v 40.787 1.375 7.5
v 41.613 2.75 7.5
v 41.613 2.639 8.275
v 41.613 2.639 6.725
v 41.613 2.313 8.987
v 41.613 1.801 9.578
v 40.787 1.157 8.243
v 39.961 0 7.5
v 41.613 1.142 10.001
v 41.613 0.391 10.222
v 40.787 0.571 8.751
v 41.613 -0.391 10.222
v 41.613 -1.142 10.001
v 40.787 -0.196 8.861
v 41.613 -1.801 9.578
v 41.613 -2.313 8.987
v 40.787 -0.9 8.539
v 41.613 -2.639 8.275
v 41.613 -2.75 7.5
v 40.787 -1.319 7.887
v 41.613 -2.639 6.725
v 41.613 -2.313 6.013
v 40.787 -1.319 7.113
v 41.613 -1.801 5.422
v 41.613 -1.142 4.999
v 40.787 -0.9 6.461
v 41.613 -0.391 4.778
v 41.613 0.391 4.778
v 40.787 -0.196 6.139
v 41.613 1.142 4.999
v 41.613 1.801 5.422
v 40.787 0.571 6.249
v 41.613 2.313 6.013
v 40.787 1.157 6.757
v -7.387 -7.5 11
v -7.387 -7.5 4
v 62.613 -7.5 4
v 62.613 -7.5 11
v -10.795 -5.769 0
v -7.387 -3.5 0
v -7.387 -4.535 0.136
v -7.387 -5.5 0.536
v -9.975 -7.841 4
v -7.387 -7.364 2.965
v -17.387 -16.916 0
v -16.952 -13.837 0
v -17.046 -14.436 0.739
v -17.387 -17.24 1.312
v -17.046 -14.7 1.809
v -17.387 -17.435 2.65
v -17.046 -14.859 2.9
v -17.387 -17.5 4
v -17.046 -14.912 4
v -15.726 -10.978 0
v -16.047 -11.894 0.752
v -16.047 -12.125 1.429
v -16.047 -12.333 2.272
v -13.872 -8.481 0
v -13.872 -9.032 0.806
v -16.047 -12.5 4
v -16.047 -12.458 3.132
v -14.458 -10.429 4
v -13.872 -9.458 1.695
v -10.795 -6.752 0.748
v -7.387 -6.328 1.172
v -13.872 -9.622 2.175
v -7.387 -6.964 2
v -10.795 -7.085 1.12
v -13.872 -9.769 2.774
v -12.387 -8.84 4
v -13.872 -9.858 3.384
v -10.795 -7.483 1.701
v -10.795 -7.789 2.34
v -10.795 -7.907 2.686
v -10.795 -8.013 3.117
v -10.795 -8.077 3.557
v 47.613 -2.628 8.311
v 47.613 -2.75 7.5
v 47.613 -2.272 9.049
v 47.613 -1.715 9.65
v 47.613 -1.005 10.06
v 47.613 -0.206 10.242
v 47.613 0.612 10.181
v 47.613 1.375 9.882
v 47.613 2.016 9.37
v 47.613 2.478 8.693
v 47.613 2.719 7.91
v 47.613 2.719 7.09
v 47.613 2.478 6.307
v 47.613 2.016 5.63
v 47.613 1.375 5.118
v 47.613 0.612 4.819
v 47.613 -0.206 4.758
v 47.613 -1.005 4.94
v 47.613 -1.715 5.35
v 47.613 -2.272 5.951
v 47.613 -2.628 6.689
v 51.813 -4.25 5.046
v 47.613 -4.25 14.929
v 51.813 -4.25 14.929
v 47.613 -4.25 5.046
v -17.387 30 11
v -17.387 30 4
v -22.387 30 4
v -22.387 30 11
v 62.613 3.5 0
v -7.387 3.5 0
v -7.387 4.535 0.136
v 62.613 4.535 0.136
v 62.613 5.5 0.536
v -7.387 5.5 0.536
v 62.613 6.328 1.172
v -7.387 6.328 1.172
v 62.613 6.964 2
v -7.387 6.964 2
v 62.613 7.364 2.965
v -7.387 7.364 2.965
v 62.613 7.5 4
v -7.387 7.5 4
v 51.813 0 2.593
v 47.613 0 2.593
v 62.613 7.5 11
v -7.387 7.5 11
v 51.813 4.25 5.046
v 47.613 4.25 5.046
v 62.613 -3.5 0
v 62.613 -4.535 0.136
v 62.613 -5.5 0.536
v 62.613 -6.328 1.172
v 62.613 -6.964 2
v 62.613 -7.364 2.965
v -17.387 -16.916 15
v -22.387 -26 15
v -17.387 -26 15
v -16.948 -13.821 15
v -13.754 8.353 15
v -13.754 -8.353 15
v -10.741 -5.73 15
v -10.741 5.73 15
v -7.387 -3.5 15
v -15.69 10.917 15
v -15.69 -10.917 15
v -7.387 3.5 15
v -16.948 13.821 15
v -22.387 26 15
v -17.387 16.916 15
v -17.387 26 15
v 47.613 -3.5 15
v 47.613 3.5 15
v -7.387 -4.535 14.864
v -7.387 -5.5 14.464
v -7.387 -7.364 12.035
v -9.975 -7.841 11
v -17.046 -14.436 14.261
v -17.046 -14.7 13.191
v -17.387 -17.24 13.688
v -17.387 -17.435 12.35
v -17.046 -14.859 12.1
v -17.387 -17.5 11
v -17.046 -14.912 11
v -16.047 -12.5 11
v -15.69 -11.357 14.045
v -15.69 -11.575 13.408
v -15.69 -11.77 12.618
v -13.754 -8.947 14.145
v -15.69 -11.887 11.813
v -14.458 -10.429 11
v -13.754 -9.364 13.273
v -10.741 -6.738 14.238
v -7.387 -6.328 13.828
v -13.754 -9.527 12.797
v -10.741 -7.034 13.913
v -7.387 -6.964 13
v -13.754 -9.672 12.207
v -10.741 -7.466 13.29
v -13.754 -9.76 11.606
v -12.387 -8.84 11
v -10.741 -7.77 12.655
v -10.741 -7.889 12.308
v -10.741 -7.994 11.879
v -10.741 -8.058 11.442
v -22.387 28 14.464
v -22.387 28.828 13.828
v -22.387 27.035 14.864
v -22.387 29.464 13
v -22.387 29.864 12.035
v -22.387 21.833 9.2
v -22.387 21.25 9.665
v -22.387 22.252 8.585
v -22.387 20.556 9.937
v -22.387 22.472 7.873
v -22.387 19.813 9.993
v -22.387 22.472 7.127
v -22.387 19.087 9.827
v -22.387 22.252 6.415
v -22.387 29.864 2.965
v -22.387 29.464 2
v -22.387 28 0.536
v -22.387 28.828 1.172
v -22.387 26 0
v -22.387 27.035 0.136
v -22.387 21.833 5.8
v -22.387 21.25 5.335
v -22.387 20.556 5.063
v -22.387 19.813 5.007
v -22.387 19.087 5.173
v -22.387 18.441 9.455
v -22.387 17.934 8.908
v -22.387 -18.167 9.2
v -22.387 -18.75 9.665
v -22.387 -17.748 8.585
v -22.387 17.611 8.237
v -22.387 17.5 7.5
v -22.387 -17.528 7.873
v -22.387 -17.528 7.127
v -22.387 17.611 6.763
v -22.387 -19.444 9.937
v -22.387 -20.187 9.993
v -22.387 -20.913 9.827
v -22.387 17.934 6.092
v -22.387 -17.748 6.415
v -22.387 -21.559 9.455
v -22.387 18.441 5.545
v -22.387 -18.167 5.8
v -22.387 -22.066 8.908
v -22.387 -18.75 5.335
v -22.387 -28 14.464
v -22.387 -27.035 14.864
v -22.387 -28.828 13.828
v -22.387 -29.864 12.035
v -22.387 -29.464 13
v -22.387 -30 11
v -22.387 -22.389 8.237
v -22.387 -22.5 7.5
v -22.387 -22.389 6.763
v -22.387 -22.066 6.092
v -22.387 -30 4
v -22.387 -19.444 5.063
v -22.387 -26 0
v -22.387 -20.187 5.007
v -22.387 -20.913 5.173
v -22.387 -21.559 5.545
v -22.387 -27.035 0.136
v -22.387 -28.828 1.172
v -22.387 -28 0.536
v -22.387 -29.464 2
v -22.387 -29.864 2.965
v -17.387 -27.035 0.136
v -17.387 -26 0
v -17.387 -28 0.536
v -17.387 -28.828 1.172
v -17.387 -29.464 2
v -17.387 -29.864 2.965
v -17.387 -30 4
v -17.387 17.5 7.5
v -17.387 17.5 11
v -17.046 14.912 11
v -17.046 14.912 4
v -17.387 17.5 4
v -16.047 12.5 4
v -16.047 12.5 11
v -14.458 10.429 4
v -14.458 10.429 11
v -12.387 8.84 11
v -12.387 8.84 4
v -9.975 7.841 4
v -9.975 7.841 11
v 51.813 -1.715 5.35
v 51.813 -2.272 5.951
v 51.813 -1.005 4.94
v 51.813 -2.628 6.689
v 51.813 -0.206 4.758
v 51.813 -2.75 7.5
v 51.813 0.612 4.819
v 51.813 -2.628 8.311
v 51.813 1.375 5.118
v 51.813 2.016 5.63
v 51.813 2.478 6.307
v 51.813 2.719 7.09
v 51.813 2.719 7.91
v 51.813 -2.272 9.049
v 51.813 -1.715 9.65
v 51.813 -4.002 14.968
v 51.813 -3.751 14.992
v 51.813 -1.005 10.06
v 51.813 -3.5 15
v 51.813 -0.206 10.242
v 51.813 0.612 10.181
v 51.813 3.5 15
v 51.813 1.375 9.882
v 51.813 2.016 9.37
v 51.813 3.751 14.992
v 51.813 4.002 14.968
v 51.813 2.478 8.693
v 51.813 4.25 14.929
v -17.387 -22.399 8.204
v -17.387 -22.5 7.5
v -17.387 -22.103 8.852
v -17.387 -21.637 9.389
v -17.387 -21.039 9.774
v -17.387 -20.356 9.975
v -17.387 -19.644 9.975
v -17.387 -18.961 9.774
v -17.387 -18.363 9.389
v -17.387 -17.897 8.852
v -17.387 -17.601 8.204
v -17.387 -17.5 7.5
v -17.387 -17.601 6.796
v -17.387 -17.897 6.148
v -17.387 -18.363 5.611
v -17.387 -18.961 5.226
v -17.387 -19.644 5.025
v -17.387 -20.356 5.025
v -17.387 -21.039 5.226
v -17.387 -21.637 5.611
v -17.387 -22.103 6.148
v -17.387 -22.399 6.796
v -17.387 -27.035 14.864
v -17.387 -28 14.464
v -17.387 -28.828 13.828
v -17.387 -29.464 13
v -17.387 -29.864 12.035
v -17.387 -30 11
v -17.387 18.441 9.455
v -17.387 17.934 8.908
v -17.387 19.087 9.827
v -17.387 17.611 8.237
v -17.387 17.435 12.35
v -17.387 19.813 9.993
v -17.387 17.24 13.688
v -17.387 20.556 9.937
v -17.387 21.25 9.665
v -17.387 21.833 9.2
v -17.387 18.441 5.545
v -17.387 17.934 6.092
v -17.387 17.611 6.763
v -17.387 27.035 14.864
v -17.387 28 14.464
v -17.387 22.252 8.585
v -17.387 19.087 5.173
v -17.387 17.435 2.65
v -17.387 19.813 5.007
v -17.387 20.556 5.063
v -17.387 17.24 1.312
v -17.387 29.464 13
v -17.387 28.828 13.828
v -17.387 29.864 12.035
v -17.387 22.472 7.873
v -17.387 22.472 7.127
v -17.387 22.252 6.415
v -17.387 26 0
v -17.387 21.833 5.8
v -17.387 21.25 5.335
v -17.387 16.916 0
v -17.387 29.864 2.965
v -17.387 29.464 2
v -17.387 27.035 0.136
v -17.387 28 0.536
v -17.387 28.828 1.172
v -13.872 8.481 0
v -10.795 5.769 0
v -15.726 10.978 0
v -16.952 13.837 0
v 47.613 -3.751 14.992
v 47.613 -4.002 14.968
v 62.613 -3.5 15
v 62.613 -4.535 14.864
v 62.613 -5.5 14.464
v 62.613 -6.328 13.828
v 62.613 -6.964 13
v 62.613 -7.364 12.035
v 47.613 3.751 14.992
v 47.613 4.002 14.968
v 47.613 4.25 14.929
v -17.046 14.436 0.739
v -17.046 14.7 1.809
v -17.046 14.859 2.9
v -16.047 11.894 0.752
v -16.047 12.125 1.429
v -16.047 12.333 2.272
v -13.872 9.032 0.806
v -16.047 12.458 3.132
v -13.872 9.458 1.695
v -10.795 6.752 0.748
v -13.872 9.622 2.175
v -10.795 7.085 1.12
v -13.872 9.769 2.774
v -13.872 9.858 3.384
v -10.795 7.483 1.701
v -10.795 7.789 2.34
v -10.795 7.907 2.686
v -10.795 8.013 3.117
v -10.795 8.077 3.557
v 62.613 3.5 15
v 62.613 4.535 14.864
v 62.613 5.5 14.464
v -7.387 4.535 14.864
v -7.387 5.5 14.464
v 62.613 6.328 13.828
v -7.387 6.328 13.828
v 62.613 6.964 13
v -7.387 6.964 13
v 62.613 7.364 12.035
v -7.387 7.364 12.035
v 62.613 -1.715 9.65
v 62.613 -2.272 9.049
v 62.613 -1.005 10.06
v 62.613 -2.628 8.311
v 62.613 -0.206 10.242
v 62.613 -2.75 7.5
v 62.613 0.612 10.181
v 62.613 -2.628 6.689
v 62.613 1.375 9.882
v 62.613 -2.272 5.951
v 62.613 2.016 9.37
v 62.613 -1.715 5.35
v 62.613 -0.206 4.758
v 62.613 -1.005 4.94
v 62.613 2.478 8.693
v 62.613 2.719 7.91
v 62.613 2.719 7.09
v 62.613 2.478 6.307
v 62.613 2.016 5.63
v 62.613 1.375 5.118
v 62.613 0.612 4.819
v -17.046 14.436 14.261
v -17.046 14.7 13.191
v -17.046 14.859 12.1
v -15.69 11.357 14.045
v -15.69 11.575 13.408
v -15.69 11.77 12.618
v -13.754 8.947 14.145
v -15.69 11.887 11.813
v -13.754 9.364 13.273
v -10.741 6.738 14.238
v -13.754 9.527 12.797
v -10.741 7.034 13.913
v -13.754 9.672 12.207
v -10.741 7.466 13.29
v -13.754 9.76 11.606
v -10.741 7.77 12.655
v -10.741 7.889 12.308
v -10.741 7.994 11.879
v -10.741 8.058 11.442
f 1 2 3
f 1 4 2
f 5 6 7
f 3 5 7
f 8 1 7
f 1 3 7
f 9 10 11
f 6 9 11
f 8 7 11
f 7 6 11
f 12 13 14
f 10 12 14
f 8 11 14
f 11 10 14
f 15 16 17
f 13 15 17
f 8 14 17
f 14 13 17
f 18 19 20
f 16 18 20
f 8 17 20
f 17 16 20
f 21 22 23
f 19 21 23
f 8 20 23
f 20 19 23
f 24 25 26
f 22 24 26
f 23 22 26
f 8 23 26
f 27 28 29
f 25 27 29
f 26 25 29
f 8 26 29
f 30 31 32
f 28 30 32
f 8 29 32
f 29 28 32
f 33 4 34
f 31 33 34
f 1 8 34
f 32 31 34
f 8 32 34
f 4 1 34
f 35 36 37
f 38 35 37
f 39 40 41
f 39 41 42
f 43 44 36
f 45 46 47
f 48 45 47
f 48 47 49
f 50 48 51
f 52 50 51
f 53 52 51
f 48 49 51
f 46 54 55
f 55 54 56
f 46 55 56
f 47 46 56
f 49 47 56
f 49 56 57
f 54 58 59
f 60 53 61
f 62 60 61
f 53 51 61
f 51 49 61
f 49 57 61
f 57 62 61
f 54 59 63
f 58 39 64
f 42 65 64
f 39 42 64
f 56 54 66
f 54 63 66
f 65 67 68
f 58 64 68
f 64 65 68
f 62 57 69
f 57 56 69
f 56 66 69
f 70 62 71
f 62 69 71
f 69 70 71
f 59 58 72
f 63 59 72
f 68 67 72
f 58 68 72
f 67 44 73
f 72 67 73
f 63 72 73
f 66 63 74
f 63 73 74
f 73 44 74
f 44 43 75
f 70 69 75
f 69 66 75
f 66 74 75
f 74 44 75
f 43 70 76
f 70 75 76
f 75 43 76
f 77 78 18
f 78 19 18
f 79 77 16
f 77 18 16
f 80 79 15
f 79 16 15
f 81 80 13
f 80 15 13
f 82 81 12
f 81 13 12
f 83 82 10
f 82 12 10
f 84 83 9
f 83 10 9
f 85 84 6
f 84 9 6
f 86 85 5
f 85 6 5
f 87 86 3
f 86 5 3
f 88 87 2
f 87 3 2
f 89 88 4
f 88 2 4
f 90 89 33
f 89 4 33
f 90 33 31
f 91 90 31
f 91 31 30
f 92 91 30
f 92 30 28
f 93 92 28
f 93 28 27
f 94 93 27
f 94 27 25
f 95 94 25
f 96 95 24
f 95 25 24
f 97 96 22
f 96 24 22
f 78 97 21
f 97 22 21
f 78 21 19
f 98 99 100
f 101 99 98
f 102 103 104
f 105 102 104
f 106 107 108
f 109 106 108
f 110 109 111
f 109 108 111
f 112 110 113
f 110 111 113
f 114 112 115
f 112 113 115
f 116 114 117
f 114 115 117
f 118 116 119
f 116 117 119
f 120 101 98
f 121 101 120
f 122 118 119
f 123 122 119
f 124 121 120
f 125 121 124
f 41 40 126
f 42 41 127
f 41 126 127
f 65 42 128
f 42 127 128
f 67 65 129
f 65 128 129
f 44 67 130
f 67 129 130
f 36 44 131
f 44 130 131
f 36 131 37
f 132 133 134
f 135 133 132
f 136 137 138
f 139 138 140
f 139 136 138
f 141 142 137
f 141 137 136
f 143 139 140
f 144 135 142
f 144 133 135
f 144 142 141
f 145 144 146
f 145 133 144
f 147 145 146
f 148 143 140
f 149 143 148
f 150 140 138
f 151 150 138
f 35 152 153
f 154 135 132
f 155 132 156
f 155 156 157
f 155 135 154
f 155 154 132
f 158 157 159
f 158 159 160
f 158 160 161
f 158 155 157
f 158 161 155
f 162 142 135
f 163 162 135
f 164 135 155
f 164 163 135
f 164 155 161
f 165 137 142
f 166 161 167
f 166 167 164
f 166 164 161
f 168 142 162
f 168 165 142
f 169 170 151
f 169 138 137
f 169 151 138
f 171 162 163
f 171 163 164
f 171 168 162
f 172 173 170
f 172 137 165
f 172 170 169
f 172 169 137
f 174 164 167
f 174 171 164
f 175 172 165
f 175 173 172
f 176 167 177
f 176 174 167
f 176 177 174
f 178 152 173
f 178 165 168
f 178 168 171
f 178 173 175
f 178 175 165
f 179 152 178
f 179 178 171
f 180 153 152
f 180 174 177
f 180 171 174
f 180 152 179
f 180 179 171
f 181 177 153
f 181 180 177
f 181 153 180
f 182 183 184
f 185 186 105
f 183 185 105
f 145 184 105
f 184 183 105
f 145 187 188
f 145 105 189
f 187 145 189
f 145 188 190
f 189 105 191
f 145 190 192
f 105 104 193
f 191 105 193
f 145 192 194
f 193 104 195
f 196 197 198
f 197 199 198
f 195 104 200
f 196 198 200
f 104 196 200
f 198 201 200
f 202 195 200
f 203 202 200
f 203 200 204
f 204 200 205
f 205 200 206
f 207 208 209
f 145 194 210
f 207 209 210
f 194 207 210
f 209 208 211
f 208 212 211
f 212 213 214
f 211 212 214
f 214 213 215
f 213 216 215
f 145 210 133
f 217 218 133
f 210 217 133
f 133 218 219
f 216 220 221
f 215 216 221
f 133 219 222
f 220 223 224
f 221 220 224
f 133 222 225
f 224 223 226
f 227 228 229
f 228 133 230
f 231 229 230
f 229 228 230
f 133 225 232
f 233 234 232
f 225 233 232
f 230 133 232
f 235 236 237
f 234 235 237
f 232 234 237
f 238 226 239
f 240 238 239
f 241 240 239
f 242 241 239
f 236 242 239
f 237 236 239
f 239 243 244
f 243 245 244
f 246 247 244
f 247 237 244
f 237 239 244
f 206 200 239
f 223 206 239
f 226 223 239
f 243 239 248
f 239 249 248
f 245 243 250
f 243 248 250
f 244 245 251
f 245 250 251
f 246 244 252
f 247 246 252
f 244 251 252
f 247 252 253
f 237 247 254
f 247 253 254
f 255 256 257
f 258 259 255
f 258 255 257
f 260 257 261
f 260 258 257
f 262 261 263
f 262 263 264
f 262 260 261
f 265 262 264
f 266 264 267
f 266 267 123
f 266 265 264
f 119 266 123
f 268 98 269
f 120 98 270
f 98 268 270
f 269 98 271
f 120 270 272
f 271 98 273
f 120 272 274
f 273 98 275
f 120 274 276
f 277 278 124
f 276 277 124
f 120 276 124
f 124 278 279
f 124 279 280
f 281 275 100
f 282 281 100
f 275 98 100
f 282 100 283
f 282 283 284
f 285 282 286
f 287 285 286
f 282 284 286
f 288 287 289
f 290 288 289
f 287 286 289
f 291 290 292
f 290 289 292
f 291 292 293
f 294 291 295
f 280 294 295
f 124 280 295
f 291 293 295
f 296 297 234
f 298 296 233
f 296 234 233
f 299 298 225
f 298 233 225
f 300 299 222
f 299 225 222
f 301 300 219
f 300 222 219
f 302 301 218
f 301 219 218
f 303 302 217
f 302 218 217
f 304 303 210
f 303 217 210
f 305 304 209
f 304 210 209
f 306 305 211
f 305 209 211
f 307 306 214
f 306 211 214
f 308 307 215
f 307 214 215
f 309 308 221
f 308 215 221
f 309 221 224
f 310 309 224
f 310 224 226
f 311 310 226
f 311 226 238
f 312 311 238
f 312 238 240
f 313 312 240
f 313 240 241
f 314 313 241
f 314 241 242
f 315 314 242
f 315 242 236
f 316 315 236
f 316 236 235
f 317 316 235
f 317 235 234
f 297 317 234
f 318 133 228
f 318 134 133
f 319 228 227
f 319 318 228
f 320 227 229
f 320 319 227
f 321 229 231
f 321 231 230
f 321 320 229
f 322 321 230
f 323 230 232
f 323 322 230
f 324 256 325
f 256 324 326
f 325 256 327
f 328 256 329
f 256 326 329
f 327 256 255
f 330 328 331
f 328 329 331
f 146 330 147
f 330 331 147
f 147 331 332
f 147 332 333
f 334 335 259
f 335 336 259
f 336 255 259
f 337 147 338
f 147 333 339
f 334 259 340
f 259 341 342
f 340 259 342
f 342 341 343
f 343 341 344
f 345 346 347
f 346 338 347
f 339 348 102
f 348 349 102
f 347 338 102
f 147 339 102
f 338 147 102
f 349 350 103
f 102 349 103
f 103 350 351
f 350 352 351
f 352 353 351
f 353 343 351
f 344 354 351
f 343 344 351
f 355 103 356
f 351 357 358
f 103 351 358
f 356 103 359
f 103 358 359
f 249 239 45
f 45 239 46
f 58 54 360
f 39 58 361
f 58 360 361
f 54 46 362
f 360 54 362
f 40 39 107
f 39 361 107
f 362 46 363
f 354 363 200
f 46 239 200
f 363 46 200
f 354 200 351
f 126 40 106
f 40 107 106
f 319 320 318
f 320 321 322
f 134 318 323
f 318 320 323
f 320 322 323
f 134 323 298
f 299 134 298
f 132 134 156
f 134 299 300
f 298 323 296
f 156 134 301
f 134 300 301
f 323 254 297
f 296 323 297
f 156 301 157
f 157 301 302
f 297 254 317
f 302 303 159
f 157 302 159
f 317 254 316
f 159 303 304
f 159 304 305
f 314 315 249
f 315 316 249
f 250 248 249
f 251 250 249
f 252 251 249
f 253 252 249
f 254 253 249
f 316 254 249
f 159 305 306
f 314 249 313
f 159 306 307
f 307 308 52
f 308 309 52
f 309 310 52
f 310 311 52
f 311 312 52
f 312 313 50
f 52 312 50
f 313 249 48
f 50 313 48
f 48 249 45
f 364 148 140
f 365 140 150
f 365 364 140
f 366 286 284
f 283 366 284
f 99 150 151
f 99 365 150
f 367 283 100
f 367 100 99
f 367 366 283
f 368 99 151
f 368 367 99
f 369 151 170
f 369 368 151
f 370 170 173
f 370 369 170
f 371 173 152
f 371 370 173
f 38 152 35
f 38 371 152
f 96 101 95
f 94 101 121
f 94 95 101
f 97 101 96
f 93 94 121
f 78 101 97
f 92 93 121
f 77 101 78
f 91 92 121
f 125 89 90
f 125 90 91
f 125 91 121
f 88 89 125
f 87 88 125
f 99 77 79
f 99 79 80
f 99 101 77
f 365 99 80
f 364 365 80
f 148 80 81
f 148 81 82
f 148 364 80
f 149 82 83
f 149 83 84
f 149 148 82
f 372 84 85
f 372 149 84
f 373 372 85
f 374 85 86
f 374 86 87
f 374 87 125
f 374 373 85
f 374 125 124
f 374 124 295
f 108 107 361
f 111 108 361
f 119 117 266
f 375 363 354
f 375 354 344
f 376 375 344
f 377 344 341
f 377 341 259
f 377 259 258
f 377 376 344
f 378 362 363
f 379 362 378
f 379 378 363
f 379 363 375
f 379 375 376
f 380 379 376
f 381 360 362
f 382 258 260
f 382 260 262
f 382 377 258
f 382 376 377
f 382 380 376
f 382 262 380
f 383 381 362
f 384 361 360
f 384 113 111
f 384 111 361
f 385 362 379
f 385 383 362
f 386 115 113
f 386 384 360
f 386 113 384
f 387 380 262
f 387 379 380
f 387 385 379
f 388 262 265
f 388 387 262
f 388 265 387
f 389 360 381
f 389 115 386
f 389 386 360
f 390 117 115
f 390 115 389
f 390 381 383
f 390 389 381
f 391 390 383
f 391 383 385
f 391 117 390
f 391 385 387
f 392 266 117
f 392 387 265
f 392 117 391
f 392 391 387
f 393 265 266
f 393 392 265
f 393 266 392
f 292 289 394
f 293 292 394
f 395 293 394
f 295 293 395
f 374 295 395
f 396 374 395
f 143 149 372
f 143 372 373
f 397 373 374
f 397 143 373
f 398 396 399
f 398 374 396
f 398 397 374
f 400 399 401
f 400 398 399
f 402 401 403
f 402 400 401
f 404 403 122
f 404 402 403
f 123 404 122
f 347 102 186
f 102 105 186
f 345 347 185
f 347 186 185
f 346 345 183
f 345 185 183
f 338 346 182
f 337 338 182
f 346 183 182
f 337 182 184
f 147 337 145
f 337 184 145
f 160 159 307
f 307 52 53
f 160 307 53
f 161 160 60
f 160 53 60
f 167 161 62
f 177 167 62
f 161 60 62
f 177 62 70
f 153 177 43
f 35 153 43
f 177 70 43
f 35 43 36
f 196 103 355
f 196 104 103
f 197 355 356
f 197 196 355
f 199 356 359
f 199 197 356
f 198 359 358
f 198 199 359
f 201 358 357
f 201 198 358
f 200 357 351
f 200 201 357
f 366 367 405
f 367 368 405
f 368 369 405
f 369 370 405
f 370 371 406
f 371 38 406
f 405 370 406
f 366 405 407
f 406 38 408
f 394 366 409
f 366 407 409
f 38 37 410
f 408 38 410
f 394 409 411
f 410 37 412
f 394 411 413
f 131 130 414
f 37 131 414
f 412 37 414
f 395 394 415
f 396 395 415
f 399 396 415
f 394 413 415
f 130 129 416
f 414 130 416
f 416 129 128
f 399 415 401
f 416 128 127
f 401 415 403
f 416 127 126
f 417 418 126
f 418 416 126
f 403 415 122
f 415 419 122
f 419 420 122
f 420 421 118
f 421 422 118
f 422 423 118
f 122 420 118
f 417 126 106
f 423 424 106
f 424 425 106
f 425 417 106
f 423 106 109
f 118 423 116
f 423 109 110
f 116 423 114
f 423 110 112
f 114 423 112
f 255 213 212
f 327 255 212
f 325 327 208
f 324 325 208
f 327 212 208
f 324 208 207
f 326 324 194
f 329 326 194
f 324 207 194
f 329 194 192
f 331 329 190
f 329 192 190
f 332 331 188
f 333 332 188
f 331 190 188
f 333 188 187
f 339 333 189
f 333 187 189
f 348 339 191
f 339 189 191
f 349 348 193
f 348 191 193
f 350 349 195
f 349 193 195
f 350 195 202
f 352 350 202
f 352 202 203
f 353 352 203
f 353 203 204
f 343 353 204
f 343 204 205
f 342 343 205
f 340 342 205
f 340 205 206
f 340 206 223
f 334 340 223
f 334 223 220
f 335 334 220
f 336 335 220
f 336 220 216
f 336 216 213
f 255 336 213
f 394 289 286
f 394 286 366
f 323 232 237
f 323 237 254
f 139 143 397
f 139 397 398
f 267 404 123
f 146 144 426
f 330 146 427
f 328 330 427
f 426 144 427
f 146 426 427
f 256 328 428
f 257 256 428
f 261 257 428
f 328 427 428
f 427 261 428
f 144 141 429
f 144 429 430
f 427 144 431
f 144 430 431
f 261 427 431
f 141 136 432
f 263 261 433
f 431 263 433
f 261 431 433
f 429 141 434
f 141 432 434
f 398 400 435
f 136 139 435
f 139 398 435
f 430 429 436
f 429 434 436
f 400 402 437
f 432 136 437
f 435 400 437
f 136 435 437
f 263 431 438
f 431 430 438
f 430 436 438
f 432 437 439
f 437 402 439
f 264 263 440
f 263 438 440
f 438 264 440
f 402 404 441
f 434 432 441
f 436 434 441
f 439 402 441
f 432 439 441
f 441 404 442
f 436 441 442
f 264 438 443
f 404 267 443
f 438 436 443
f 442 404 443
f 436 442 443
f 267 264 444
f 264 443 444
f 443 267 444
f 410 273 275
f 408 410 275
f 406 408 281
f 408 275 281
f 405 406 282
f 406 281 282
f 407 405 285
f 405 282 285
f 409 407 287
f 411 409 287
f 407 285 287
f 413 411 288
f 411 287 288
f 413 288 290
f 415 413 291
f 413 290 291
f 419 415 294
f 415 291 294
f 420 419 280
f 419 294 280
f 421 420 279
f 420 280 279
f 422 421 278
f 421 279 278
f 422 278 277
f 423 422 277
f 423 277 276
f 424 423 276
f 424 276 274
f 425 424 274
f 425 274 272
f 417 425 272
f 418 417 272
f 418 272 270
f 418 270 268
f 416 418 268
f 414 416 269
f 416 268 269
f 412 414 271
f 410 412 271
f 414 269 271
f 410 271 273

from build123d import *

# Parameters (mm, degrees)
F1_DEPTH     = 15
F3_D         = 5.5
F3_DEPTH     = 21
F3_TIP       = 1.6523667023
F5_D         = 5
F6_R         = 4
F7_T1_DEPTH  = 7
F7_T6_ANGLE  = 359.64
F7_T12_ANGLE = 359.64
F7_T18_ANGLE = 359.64
F7_T24_ANGLE = 359.64
F10_DEPTH    = 4.2


# Not quite as in the source:
# - a fillet or chamfer that OpenCascade refuses, or shapes differently, is made with other operations: its cross-section is extruded or revolved along the edge and cut away or added


with BuildPart() as f1:
    # F0 (on Top) → F1 (new body)
    with BuildSketch(Plane.XY):
        Polygon((-17.3867209846, 30), (-22.3867209846, 30), (-22.3867209846, -30), (-17.3867209846, -30), (-17.3867209846, -7.5), (62.6132790154, -7.5), (62.6132790154, 7.5), (-17.3867209846, 7.5), align=None)
    extrude(amount=F1_DEPTH)

    # F3
    with Locations(Plane.YZ.offset(62.6132790154)):
        with Locations((0, 7.5)):
            Hole(F3_D / 2, depth=F3_DEPTH)
            with Locations((0, 0, -(F3_DEPTH + F3_TIP / 2))):  # 118° drill point
                Cone(0, F3_D / 2, F3_TIP, mode=Mode.SUBTRACT)

    # F5 (through all)
    with Locations(Plane.YZ.offset(-17.3867209846)):
        with Locations((-20, 7.5), (20, 7.5)):
            Hole(F5_D / 2)

    # F6
    f6_edges = [f1.edges().sort_by_distance(p)[0] for p in [
        (22.613279, -7.5, 15),
        (22.613279, 7.5, 15),
        (22.613279, -7.5, 0),
        (22.613279, 7.5, 0),
        (-19.886721, -30, 15),
        (-19.886721, -30, 0),
        (-19.886721, 30, 15),
        (-19.886721, 30, 0),
    ]]
    fillet(f6_edges, radius=F6_R)

    # F7: fillet of radius 10 on 2 edges, made by hand

    # F7_s2 → F7_t1 (join)
    with BuildSketch(Plane.XY.offset(4)):
        with BuildLine():
            ThreePointArc((-17.3867209846, -17.5), (-14.4577887965, -10.4289321881), (-7.3867209846, -7.5))
            Line((-7.3867209846, -7.5), (-17.3867209846, -7.5))
            Line((-17.3867209846, -7.5), (-17.3867209846, -17.5))
        make_face()
        with BuildLine():
            ThreePointArc((-17.3867209846, 17.5), (-14.4577887965, 10.4289321881), (-7.3867209846, 7.5))
            Line((-7.3867209846, 7.5), (-17.3867209846, 7.5))
            Line((-17.3867209846, 7.5), (-17.3867209846, 17.5))
        make_face()
    extrude(amount=F7_T1_DEPTH)


with BuildPart() as f7_tool4:
    # F7_s5 → F7_t6 (revolve)
    with BuildSketch(Plane(origin=(0, -0.0249939071, 3.9778515186), x_dir=(1, 0, 0), z_dir=(0, 0.006283144, -0.9999802609))):
        with BuildLine():
            ThreePointArc((-17.3867209846, -17.5250634889), (-14.4577887965, -10.453995677), (-7.3867209846, -7.5250634889))
            Line((-7.3867209846, -7.5250634889), (-17.3867209846, -7.5250634889))
            Line((-17.3867209846, -7.5250634889), (-17.3867209846, -17.5250634889))
        make_face()
    revolve(axis=Axis((-17.3867209846, 3.5, 4), (1, 0, 0)), revolution_arc=F7_T6_ANGLE)

    split(bisect_by=Plane.XY, keep=Keep.TOP)

    split(bisect_by=Plane.XY.offset(15), keep=Keep.BOTTOM)


with BuildPart() as f1_1:
    add(f1.part)

    # F7_t3: union F7_tool4
    add(f7_tool4.part)


with BuildPart() as f7_tool10:
    # F7_s11 → F7_t12 (revolve)
    with BuildSketch(Plane(origin=(0, 0.069251392, 11.0215563129), x_dir=(1, 0, 0), z_dir=(0, 0.006283144, 0.9999802609))):
        with BuildLine():
            ThreePointArc((-17.3867209846, 17.4308163294), (-14.4577887965, 10.3597485175), (-7.3867209846, 7.4308163294))
            Line((-7.3867209846, 7.4308163294), (-17.3867209846, 7.4308163294))
            Line((-17.3867209846, 7.4308163294), (-17.3867209846, 17.4308163294))
        make_face()
    revolve(axis=Axis((-17.3867209846, 3.5, 11), (-1, 0, 0)), revolution_arc=F7_T12_ANGLE)

    split(bisect_by=Plane.XY, keep=Keep.TOP)

    split(bisect_by=Plane.XY.offset(15), keep=Keep.BOTTOM)


with BuildPart() as f1_2:
    add(f1_1.part)

    # F7_t9: union F7_tool10
    add(f7_tool10.part)


with BuildPart() as f7_tool16:
    # F7_s17 → F7_t18 (revolve)
    with BuildSketch(Plane(origin=(0, 0.0249939071, 3.9778515186), x_dir=(1, 0, 0), z_dir=(0, -0.006283144, -0.9999802609))):
        with BuildLine():
            ThreePointArc((-17.3867209846, 17.5250634889), (-14.4577887965, 10.453995677), (-7.3867209846, 7.5250634889))
            Line((-7.3867209846, 7.5250634889), (-17.3867209846, 7.5250634889))
            Line((-17.3867209846, 7.5250634889), (-17.3867209846, 17.5250634889))
        make_face()
    revolve(axis=Axis((-17.3867209846, -3.5, 4), (-1, 0, 0)), revolution_arc=F7_T18_ANGLE)

    split(bisect_by=Plane.XY, keep=Keep.TOP)

    split(bisect_by=Plane.XY.offset(15), keep=Keep.BOTTOM)


with BuildPart() as f1_3:
    add(f1_2.part)

    # F7_t15: union F7_tool16
    add(f7_tool16.part)


with BuildPart() as f7_tool22:
    # F7_s23 → F7_t24 (revolve)
    with BuildSketch(Plane(origin=(0, -0.069251392, 11.0215563129), x_dir=(1, 0, 0), z_dir=(0, -0.006283144, 0.9999802609))):
        with BuildLine():
            ThreePointArc((-17.3867209846, -17.4308163294), (-14.4577887965, -10.3597485175), (-7.3867209846, -7.4308163294))
            Line((-7.3867209846, -7.4308163294), (-17.3867209846, -7.4308163294))
            Line((-17.3867209846, -7.4308163294), (-17.3867209846, -17.4308163294))
        make_face()
    revolve(axis=Axis((-17.3867209846, -3.5, 11), (1, 0, 0)), revolution_arc=F7_T24_ANGLE)

    split(bisect_by=Plane.XY, keep=Keep.TOP)

    split(bisect_by=Plane.XY.offset(15), keep=Keep.BOTTOM)


with BuildPart() as f1_4:
    add(f1_3.part)

    # F7_t21: union F7_tool22
    add(f7_tool22.part)

    # F9 (on offset) → F10 (cut)
    with BuildSketch(Plane.YZ.offset(47.6132790154)):
        Polygon((0, 2.5925227119), (4.25, 5.0462613559), (4.25, 9.9537386441), (4.25, 17.4553611223), (-4.25, 17.4553611223), (-4.25, 9.9537386441), (-4.25, 5.0462613559), align=None)
    extrude(amount=F10_DEPTH, mode=Mode.SUBTRACT)


solid = f1_4.part
